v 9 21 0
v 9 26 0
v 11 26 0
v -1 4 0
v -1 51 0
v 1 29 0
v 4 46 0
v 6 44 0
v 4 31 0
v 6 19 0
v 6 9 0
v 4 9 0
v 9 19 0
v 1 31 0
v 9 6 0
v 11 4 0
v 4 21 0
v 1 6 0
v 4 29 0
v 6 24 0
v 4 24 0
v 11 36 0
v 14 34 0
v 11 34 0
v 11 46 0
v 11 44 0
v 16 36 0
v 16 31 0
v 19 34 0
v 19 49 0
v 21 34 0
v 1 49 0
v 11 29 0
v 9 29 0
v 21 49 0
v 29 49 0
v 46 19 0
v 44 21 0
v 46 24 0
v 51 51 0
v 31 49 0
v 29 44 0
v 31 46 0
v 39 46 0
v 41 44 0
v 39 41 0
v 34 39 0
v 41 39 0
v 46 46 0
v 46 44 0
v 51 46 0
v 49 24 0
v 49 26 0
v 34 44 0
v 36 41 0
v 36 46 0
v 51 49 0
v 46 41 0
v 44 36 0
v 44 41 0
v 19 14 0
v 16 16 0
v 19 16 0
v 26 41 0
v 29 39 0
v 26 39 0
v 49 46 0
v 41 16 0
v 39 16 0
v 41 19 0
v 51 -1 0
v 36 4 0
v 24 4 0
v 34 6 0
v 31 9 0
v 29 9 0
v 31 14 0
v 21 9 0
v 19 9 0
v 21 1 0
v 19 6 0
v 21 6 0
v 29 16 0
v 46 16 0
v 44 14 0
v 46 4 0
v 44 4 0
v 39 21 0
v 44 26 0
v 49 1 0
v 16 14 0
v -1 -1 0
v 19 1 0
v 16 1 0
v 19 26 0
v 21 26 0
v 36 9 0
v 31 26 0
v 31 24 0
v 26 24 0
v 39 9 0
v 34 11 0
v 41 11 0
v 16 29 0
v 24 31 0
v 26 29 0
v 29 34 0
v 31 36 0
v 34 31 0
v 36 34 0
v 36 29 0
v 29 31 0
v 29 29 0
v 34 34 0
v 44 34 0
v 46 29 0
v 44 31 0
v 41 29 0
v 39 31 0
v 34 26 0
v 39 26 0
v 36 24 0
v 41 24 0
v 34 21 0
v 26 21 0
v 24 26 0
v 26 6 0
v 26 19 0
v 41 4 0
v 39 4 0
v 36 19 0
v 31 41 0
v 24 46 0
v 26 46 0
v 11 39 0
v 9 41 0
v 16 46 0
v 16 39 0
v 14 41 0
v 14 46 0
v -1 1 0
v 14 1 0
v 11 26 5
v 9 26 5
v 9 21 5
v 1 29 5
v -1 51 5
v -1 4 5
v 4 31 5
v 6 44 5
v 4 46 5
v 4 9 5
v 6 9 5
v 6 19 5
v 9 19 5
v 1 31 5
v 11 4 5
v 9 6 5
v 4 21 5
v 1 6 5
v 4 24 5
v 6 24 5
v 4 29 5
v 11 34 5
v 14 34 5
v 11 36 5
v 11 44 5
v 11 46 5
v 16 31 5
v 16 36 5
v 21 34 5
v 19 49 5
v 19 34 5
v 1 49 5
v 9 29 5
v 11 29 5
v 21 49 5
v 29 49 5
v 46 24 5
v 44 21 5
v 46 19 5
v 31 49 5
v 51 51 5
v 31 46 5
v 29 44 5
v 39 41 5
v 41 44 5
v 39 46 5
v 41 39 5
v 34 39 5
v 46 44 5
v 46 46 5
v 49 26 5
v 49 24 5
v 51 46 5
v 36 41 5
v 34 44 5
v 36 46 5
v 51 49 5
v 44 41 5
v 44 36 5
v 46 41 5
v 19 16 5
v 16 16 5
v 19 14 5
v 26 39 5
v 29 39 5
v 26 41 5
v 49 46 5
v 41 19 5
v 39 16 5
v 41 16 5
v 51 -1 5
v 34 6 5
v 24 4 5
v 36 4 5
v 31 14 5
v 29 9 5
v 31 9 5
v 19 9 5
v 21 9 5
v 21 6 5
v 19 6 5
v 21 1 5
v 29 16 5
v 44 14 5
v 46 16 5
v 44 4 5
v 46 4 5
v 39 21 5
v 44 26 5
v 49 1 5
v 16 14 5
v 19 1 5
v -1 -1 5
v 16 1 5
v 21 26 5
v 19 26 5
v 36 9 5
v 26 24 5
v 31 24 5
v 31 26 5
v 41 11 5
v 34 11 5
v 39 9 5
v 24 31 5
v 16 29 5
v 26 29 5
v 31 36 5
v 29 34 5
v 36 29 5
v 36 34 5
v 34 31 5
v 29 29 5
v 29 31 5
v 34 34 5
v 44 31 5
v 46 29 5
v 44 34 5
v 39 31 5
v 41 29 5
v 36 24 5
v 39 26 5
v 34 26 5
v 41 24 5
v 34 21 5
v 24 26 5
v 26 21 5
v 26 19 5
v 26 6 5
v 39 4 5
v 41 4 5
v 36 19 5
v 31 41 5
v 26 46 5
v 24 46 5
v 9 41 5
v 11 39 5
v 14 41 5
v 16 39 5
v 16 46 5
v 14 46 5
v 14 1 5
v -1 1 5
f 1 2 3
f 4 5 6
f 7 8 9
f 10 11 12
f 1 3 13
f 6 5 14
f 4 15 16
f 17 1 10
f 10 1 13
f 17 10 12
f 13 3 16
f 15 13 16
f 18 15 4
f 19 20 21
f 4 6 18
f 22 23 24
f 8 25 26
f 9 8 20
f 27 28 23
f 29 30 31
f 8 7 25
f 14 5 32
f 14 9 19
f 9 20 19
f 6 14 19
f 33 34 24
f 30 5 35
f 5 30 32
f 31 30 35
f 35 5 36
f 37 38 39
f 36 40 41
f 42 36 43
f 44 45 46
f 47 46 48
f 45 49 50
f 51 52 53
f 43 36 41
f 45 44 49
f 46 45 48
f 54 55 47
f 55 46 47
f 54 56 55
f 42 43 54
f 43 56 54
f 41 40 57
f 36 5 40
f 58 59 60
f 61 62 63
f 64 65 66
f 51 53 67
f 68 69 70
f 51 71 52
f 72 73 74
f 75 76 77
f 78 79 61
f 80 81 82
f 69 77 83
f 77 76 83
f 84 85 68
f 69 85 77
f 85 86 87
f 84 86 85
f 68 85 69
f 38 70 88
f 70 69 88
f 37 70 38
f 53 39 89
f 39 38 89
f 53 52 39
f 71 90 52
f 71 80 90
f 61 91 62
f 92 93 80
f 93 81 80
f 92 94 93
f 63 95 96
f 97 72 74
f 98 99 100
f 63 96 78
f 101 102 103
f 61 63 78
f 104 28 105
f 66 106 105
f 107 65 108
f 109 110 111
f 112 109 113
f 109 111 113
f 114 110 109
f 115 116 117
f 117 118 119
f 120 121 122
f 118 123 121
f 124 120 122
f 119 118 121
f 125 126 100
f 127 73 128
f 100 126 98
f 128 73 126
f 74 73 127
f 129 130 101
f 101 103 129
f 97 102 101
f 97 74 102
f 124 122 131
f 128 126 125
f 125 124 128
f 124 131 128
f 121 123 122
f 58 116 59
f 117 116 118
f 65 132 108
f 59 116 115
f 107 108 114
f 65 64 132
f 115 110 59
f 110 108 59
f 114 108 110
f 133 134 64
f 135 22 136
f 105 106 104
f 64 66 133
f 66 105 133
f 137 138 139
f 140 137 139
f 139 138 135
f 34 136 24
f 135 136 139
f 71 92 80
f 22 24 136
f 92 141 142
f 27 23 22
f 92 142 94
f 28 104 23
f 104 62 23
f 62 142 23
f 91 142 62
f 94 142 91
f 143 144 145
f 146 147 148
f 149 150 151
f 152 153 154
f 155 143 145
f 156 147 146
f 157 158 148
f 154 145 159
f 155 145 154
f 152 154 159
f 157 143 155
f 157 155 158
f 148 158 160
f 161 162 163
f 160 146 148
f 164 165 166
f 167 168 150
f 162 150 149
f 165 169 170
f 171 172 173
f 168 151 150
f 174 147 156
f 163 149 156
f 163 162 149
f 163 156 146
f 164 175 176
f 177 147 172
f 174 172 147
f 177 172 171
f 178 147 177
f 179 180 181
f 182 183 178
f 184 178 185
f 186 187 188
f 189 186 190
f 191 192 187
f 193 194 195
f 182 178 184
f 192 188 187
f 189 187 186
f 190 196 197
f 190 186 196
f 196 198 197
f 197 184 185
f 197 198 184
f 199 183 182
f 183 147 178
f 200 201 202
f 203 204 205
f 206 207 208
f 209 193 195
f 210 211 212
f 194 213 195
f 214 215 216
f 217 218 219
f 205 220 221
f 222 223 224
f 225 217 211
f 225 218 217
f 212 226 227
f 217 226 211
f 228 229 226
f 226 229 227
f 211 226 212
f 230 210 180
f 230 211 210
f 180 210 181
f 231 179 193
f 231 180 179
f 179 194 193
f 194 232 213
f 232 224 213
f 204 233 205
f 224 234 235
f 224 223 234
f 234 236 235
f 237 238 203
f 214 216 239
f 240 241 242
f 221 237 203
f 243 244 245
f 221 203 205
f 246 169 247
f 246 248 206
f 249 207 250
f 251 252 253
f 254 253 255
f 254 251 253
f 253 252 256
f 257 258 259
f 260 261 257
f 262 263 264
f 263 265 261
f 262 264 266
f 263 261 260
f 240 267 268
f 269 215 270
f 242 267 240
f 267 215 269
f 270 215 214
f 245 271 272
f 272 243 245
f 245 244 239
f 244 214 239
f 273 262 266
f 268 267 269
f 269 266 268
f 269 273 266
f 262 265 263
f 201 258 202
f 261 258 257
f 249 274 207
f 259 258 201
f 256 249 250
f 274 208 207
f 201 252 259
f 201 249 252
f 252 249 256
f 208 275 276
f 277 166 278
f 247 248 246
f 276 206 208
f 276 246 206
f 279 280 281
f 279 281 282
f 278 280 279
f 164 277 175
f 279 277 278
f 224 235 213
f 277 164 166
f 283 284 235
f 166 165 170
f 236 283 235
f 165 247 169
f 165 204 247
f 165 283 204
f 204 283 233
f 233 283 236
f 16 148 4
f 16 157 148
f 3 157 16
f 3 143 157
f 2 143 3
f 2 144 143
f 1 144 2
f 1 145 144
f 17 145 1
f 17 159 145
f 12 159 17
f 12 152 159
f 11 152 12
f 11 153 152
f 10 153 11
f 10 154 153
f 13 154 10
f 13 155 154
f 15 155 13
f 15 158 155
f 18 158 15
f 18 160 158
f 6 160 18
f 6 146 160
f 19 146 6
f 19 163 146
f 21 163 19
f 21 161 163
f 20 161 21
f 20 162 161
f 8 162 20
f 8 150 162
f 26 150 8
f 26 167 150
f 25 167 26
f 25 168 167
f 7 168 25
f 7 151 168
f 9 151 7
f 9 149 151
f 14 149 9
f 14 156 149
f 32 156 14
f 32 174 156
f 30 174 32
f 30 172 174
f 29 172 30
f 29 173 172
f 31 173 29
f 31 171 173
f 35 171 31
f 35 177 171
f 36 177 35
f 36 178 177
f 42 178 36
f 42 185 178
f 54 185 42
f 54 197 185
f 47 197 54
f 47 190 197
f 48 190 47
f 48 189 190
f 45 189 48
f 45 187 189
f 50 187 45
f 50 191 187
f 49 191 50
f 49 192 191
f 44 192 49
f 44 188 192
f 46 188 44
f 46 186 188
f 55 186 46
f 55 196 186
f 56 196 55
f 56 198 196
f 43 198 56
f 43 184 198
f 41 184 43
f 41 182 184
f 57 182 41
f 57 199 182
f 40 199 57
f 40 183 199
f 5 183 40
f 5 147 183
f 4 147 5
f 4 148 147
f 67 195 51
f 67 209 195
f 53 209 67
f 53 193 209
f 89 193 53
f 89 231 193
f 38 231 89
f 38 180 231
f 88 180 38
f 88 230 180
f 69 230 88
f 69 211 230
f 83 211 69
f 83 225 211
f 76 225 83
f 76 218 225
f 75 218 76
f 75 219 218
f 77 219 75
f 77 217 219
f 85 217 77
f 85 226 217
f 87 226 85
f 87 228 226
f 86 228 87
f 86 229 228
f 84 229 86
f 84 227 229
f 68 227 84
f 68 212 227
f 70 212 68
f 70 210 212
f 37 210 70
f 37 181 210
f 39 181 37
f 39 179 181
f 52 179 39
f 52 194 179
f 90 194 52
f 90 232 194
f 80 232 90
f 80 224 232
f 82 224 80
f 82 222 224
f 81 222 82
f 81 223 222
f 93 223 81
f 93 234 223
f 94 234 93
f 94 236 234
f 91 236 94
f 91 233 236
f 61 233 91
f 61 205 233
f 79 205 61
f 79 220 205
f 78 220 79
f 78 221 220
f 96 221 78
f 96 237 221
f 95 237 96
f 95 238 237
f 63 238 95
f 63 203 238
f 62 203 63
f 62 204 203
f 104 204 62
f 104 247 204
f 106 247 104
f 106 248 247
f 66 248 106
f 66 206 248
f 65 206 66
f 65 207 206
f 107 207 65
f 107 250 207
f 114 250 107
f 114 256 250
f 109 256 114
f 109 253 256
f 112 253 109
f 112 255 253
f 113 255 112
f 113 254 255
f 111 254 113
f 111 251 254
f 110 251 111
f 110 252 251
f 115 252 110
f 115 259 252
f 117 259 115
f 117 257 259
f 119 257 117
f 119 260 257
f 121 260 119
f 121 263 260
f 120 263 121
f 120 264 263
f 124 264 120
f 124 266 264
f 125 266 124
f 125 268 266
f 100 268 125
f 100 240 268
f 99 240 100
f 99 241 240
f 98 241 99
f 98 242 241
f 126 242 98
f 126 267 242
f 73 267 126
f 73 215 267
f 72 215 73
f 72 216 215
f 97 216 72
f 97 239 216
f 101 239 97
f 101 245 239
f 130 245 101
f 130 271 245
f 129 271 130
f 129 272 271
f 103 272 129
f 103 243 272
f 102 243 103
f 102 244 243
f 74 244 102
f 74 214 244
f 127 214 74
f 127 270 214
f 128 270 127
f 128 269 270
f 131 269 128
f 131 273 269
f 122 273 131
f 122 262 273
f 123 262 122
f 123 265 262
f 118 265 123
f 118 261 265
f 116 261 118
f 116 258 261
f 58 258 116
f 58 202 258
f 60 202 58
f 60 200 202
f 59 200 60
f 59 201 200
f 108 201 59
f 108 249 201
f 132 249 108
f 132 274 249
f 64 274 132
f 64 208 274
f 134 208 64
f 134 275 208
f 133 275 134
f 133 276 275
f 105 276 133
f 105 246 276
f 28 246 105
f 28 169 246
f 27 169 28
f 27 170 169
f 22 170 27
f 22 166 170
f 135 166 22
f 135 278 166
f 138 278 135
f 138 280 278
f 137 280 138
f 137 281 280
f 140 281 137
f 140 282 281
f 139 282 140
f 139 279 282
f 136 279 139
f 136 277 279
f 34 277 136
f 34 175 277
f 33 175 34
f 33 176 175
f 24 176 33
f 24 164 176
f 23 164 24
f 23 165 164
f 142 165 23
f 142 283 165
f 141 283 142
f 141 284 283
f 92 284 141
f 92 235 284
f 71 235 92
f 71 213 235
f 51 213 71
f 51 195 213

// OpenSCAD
rows = 10; 
columns = 10; 
wall_thickness = 2;
wall_height = 5;
block_width = 5;


/*
 * constants, for clearness
 *
 */
 
// random directions, for picking up a direction to visit the next block
function PERMUTATION_OF_FOUR() = [
    [1, 2, 3, 4],
    [1, 2, 4, 3],
    [1, 3, 2, 4],
    [1, 3, 4, 2],
    [1, 4, 2, 3],
    [1, 4, 3, 2],
    [2, 1, 3, 4],
    [2, 1, 4, 3],
    [2, 3, 1, 4],
    [2, 3, 4, 1],
    [2, 4, 1, 3],
    [2, 4, 3, 1],
    [3, 1, 2, 4],
    [3, 1, 4, 2],
    [3, 2, 1, 4],
    [3, 2, 4, 1],
    [3, 4, 1, 2],
    [3, 4, 2, 1],
    [4, 1, 2, 3],
    [4, 1, 3, 2],
    [4, 2, 1, 3],
    [4, 2, 3, 1],
    [4, 3, 1, 2],
    [4, 3, 2, 1]
];

function NO_WALL() = 0;
function UP_WALL() = 1;
function RIGHT_WALL() = 2;
function UP_RIGHT_WALL() = 3;

function NOT_VISITED() = 0;
function VISITED() = 1;

/* 
 * modules for creating a maze
 *
 */

// give a [x, y] point and length. draw a line in the x direction
module x_line(point, length, thickness = 1) {
    offset = thickness / 2;
    translate([point[0] - offset, point[1] - offset, 0]) 
        square([length + thickness, thickness]);
}

// give a [x, y] point and length. draw a line in the y direction
module y_line(point, length, thickness = 1) {
    offset = thickness / 2;
    translate([point[0] - offset, point[1] - offset, 0])  
        square([thickness, length + thickness]);
}

// create the outer wall of maze
module maze_outer_wall(rows, columns, block_width = 5, wall_thickness = 1) {
    x_line([0, rows * block_width], columns * block_width, wall_thickness);
    y_line([0, block_width], (rows - 1) * block_width, wall_thickness);
}

// create the inner wall of maze
module maze_inner_wall(maze, block_width = 5, wall_thickness = 1) {
    for(i = [0:len(maze) - 1]) {
        cord = maze[i];
        x = (cord[0] - 1) * block_width;
        y = (cord[1] - 1) * block_width;
        v = cord[3];
        
        if(v == 1 || v == 3) {
            x_line([x, y], block_width, wall_thickness);
        }
        if(v == 2 || v == 3) {
            y_line([x + block_width, y], block_width, wall_thickness);
        }
    }  
}

// create a maze
module maze(rows, columns, maze_vector, block_width = 5, wall_thickness = 1) {
     maze_outer_wall(rows, columns, block_width, wall_thickness);
     maze_inner_wall(maze_vector, block_width, wall_thickness);
}

/* 
 * utilities functions
 *
 */

// comare the equality of [x1, y1] and [x2, y2]
function cord_equals(cord1, cord2) = cord1 == cord2;

// is the point visited?
function not_visited(cord, vs, index = 0) =
    index == len(vs) ? true : 
        (cord_equals([vs[index][0], vs[index][1]], cord) && vs[index][2] == 1 ? false :
            not_visited(cord, vs, index + 1));
            
// pick a direction randomly
function rand_dirs() =
    PERMUTATION_OF_FOUR()[round(rands(0, 24, 1)[0])]; 

// give a index (exclusivly), slice a vector 
function head_to(i, vs) =
    i >= len(vs) ? vs : (
        i == 0 ? [] : concat(head_to(i - 1, vs), [vs[i - 1]])
    );

// give a index (exclusivly), slice a vector 
function tail_from(i, vs, index = 0, new_vs = []) =
    i >= len(vs) ? [] : (
        index < i ? tail_from(i, vs, index + 1) : (
            index < len(vs) ? tail_from(i, vs, index + 1, concat(new_vs, [vs[index]])) : new_vs
        )
    );

// replace v1 in the vector with v2 
function replace(v1, v2, vs, index = 0) =
    index == len(vs) ? vs : (
        vs[index] == v1 ? concat(concat(head_to(index, vs), [v2]), tail_from(index + 1, vs)) : replace(v1, v2, vs, index + 1)
    );
    
/* 
 * functions for generating a maze vector
 *
 */

// initialize rows of a maze
function init_row(n, length) =
    length == 0 ? [] : concat(init_row(n, length - 1), [[length, n, 0, UP_RIGHT_WALL()]]);
    
// initialize a maze
function init_maze(rows, columns) =
    rows == 0 ? [] : concat(init_maze(rows - 1, columns), init_row(rows, columns));
    
// find a vector in the maze vector
function find(i, j, maze_vector, index = 0) =
    index == len(maze_vector) ? [] : (
        cord_equals([i, j], [maze_vector[index][0], maze_vector[index][1]]) ? maze_vector[index] : find(i, j, maze_vector, index + 1)
    );

////
// NO_WALL = 0;
// UP_WALL = 1;
// RIGHT_WALL = 2;
// UP_RIGHT_WALL = 3;
function delete_right_wall(original_block) = 
    original_block == NO_WALL() || original_block == RIGHT_WALL() ? NO_WALL() : UP_WALL();

function delete_up_wall(original_block) = 
    (original_block == NO_WALL() || original_block == UP_WALL()) ? NO_WALL() : RIGHT_WALL();
    
function delete_right_wall_of(vs, is_visited, maze_vector) =
    replace(vs, [vs[0], vs[1] , is_visited, delete_right_wall(vs[3])] ,maze_vector);

function delete_up_wall_of(vs, is_visited, maze_vector) =
    replace(vs, [vs[0], vs[1] , is_visited, delete_up_wall(vs[3])] ,maze_vector);

function go_right(i, j, rows, columns, maze_vector) =
    go_maze(i + 1, j, rows, columns, delete_right_wall_of(find(i, j, maze_vector), VISITED(), maze_vector));
    
function go_up(i, j, rows, columns, maze_vector) =
    go_maze(i, j - 1, rows, columns, delete_up_wall_of(find(i, j, maze_vector), VISITED(), maze_vector));
    
function visit(v, maze_vector) =
    replace(v, [v[0], v[1], VISITED(), v[3]], maze_vector);
 
function go_left(i, j, rows, columns, maze_vector) =
    go_maze(i - 1, j, rows, columns, delete_right_wall_of(find(i - 1, j, maze_vector), NOT_VISITED(), maze_vector));
    
function go_down(i, j, rows, columns, maze_vector) =
    go_maze(i, j + 1, rows, columns, delete_up_wall_of(find(i, j + 1, maze_vector), NOT_VISITED(), maze_vector));
    
function go_maze(i, j, rows, columns, maze_vector) =
    look_around(i, j, rand_dirs(), rows, columns, visit(find(i, j, maze_vector), maze_vector));
    
function look_around(i, j, dirs, rows, columns, maze_vector, index = 0) =
    index == 4 ? maze_vector : 
        look_around( 
            i, j, dirs, 
            rows, columns, 
            build_wall(i, j, dirs[index], rows, columns, maze_vector), 
            index + 1
        ); 

function build_wall(i, j, n, rows, columns, maze_vector) = 
    n == 1 && i != columns && not_visited([i + 1, j], maze_vector) ? go_right(i, j, rows, columns, maze_vector) : ( 
        n == 2 && j != 1 && not_visited([i, j - 1], maze_vector) ? go_up(i, j, rows, columns, maze_vector)  : (
            n == 3 && i != 1 && not_visited([i - 1, j], maze_vector) ? go_left(i, j,rows, columns,  maze_vector)  : (
                n == 4 && j != rows && not_visited([i, j + 1], maze_vector) ? go_down(i, j, rows, columns, maze_vector) : maze_vector
            ) 
        )
    ); 
 
/*
 * create a maze
 *
 */
maze_vector = go_maze(1, 1, rows, columns, replace([columns, rows, 0, UP_RIGHT_WALL()], [columns, rows, 0, UP_WALL()], init_maze(rows, columns)));
linear_extrude(wall_height) 
    maze(rows, columns, maze_vector, block_width, wall_thickness);
